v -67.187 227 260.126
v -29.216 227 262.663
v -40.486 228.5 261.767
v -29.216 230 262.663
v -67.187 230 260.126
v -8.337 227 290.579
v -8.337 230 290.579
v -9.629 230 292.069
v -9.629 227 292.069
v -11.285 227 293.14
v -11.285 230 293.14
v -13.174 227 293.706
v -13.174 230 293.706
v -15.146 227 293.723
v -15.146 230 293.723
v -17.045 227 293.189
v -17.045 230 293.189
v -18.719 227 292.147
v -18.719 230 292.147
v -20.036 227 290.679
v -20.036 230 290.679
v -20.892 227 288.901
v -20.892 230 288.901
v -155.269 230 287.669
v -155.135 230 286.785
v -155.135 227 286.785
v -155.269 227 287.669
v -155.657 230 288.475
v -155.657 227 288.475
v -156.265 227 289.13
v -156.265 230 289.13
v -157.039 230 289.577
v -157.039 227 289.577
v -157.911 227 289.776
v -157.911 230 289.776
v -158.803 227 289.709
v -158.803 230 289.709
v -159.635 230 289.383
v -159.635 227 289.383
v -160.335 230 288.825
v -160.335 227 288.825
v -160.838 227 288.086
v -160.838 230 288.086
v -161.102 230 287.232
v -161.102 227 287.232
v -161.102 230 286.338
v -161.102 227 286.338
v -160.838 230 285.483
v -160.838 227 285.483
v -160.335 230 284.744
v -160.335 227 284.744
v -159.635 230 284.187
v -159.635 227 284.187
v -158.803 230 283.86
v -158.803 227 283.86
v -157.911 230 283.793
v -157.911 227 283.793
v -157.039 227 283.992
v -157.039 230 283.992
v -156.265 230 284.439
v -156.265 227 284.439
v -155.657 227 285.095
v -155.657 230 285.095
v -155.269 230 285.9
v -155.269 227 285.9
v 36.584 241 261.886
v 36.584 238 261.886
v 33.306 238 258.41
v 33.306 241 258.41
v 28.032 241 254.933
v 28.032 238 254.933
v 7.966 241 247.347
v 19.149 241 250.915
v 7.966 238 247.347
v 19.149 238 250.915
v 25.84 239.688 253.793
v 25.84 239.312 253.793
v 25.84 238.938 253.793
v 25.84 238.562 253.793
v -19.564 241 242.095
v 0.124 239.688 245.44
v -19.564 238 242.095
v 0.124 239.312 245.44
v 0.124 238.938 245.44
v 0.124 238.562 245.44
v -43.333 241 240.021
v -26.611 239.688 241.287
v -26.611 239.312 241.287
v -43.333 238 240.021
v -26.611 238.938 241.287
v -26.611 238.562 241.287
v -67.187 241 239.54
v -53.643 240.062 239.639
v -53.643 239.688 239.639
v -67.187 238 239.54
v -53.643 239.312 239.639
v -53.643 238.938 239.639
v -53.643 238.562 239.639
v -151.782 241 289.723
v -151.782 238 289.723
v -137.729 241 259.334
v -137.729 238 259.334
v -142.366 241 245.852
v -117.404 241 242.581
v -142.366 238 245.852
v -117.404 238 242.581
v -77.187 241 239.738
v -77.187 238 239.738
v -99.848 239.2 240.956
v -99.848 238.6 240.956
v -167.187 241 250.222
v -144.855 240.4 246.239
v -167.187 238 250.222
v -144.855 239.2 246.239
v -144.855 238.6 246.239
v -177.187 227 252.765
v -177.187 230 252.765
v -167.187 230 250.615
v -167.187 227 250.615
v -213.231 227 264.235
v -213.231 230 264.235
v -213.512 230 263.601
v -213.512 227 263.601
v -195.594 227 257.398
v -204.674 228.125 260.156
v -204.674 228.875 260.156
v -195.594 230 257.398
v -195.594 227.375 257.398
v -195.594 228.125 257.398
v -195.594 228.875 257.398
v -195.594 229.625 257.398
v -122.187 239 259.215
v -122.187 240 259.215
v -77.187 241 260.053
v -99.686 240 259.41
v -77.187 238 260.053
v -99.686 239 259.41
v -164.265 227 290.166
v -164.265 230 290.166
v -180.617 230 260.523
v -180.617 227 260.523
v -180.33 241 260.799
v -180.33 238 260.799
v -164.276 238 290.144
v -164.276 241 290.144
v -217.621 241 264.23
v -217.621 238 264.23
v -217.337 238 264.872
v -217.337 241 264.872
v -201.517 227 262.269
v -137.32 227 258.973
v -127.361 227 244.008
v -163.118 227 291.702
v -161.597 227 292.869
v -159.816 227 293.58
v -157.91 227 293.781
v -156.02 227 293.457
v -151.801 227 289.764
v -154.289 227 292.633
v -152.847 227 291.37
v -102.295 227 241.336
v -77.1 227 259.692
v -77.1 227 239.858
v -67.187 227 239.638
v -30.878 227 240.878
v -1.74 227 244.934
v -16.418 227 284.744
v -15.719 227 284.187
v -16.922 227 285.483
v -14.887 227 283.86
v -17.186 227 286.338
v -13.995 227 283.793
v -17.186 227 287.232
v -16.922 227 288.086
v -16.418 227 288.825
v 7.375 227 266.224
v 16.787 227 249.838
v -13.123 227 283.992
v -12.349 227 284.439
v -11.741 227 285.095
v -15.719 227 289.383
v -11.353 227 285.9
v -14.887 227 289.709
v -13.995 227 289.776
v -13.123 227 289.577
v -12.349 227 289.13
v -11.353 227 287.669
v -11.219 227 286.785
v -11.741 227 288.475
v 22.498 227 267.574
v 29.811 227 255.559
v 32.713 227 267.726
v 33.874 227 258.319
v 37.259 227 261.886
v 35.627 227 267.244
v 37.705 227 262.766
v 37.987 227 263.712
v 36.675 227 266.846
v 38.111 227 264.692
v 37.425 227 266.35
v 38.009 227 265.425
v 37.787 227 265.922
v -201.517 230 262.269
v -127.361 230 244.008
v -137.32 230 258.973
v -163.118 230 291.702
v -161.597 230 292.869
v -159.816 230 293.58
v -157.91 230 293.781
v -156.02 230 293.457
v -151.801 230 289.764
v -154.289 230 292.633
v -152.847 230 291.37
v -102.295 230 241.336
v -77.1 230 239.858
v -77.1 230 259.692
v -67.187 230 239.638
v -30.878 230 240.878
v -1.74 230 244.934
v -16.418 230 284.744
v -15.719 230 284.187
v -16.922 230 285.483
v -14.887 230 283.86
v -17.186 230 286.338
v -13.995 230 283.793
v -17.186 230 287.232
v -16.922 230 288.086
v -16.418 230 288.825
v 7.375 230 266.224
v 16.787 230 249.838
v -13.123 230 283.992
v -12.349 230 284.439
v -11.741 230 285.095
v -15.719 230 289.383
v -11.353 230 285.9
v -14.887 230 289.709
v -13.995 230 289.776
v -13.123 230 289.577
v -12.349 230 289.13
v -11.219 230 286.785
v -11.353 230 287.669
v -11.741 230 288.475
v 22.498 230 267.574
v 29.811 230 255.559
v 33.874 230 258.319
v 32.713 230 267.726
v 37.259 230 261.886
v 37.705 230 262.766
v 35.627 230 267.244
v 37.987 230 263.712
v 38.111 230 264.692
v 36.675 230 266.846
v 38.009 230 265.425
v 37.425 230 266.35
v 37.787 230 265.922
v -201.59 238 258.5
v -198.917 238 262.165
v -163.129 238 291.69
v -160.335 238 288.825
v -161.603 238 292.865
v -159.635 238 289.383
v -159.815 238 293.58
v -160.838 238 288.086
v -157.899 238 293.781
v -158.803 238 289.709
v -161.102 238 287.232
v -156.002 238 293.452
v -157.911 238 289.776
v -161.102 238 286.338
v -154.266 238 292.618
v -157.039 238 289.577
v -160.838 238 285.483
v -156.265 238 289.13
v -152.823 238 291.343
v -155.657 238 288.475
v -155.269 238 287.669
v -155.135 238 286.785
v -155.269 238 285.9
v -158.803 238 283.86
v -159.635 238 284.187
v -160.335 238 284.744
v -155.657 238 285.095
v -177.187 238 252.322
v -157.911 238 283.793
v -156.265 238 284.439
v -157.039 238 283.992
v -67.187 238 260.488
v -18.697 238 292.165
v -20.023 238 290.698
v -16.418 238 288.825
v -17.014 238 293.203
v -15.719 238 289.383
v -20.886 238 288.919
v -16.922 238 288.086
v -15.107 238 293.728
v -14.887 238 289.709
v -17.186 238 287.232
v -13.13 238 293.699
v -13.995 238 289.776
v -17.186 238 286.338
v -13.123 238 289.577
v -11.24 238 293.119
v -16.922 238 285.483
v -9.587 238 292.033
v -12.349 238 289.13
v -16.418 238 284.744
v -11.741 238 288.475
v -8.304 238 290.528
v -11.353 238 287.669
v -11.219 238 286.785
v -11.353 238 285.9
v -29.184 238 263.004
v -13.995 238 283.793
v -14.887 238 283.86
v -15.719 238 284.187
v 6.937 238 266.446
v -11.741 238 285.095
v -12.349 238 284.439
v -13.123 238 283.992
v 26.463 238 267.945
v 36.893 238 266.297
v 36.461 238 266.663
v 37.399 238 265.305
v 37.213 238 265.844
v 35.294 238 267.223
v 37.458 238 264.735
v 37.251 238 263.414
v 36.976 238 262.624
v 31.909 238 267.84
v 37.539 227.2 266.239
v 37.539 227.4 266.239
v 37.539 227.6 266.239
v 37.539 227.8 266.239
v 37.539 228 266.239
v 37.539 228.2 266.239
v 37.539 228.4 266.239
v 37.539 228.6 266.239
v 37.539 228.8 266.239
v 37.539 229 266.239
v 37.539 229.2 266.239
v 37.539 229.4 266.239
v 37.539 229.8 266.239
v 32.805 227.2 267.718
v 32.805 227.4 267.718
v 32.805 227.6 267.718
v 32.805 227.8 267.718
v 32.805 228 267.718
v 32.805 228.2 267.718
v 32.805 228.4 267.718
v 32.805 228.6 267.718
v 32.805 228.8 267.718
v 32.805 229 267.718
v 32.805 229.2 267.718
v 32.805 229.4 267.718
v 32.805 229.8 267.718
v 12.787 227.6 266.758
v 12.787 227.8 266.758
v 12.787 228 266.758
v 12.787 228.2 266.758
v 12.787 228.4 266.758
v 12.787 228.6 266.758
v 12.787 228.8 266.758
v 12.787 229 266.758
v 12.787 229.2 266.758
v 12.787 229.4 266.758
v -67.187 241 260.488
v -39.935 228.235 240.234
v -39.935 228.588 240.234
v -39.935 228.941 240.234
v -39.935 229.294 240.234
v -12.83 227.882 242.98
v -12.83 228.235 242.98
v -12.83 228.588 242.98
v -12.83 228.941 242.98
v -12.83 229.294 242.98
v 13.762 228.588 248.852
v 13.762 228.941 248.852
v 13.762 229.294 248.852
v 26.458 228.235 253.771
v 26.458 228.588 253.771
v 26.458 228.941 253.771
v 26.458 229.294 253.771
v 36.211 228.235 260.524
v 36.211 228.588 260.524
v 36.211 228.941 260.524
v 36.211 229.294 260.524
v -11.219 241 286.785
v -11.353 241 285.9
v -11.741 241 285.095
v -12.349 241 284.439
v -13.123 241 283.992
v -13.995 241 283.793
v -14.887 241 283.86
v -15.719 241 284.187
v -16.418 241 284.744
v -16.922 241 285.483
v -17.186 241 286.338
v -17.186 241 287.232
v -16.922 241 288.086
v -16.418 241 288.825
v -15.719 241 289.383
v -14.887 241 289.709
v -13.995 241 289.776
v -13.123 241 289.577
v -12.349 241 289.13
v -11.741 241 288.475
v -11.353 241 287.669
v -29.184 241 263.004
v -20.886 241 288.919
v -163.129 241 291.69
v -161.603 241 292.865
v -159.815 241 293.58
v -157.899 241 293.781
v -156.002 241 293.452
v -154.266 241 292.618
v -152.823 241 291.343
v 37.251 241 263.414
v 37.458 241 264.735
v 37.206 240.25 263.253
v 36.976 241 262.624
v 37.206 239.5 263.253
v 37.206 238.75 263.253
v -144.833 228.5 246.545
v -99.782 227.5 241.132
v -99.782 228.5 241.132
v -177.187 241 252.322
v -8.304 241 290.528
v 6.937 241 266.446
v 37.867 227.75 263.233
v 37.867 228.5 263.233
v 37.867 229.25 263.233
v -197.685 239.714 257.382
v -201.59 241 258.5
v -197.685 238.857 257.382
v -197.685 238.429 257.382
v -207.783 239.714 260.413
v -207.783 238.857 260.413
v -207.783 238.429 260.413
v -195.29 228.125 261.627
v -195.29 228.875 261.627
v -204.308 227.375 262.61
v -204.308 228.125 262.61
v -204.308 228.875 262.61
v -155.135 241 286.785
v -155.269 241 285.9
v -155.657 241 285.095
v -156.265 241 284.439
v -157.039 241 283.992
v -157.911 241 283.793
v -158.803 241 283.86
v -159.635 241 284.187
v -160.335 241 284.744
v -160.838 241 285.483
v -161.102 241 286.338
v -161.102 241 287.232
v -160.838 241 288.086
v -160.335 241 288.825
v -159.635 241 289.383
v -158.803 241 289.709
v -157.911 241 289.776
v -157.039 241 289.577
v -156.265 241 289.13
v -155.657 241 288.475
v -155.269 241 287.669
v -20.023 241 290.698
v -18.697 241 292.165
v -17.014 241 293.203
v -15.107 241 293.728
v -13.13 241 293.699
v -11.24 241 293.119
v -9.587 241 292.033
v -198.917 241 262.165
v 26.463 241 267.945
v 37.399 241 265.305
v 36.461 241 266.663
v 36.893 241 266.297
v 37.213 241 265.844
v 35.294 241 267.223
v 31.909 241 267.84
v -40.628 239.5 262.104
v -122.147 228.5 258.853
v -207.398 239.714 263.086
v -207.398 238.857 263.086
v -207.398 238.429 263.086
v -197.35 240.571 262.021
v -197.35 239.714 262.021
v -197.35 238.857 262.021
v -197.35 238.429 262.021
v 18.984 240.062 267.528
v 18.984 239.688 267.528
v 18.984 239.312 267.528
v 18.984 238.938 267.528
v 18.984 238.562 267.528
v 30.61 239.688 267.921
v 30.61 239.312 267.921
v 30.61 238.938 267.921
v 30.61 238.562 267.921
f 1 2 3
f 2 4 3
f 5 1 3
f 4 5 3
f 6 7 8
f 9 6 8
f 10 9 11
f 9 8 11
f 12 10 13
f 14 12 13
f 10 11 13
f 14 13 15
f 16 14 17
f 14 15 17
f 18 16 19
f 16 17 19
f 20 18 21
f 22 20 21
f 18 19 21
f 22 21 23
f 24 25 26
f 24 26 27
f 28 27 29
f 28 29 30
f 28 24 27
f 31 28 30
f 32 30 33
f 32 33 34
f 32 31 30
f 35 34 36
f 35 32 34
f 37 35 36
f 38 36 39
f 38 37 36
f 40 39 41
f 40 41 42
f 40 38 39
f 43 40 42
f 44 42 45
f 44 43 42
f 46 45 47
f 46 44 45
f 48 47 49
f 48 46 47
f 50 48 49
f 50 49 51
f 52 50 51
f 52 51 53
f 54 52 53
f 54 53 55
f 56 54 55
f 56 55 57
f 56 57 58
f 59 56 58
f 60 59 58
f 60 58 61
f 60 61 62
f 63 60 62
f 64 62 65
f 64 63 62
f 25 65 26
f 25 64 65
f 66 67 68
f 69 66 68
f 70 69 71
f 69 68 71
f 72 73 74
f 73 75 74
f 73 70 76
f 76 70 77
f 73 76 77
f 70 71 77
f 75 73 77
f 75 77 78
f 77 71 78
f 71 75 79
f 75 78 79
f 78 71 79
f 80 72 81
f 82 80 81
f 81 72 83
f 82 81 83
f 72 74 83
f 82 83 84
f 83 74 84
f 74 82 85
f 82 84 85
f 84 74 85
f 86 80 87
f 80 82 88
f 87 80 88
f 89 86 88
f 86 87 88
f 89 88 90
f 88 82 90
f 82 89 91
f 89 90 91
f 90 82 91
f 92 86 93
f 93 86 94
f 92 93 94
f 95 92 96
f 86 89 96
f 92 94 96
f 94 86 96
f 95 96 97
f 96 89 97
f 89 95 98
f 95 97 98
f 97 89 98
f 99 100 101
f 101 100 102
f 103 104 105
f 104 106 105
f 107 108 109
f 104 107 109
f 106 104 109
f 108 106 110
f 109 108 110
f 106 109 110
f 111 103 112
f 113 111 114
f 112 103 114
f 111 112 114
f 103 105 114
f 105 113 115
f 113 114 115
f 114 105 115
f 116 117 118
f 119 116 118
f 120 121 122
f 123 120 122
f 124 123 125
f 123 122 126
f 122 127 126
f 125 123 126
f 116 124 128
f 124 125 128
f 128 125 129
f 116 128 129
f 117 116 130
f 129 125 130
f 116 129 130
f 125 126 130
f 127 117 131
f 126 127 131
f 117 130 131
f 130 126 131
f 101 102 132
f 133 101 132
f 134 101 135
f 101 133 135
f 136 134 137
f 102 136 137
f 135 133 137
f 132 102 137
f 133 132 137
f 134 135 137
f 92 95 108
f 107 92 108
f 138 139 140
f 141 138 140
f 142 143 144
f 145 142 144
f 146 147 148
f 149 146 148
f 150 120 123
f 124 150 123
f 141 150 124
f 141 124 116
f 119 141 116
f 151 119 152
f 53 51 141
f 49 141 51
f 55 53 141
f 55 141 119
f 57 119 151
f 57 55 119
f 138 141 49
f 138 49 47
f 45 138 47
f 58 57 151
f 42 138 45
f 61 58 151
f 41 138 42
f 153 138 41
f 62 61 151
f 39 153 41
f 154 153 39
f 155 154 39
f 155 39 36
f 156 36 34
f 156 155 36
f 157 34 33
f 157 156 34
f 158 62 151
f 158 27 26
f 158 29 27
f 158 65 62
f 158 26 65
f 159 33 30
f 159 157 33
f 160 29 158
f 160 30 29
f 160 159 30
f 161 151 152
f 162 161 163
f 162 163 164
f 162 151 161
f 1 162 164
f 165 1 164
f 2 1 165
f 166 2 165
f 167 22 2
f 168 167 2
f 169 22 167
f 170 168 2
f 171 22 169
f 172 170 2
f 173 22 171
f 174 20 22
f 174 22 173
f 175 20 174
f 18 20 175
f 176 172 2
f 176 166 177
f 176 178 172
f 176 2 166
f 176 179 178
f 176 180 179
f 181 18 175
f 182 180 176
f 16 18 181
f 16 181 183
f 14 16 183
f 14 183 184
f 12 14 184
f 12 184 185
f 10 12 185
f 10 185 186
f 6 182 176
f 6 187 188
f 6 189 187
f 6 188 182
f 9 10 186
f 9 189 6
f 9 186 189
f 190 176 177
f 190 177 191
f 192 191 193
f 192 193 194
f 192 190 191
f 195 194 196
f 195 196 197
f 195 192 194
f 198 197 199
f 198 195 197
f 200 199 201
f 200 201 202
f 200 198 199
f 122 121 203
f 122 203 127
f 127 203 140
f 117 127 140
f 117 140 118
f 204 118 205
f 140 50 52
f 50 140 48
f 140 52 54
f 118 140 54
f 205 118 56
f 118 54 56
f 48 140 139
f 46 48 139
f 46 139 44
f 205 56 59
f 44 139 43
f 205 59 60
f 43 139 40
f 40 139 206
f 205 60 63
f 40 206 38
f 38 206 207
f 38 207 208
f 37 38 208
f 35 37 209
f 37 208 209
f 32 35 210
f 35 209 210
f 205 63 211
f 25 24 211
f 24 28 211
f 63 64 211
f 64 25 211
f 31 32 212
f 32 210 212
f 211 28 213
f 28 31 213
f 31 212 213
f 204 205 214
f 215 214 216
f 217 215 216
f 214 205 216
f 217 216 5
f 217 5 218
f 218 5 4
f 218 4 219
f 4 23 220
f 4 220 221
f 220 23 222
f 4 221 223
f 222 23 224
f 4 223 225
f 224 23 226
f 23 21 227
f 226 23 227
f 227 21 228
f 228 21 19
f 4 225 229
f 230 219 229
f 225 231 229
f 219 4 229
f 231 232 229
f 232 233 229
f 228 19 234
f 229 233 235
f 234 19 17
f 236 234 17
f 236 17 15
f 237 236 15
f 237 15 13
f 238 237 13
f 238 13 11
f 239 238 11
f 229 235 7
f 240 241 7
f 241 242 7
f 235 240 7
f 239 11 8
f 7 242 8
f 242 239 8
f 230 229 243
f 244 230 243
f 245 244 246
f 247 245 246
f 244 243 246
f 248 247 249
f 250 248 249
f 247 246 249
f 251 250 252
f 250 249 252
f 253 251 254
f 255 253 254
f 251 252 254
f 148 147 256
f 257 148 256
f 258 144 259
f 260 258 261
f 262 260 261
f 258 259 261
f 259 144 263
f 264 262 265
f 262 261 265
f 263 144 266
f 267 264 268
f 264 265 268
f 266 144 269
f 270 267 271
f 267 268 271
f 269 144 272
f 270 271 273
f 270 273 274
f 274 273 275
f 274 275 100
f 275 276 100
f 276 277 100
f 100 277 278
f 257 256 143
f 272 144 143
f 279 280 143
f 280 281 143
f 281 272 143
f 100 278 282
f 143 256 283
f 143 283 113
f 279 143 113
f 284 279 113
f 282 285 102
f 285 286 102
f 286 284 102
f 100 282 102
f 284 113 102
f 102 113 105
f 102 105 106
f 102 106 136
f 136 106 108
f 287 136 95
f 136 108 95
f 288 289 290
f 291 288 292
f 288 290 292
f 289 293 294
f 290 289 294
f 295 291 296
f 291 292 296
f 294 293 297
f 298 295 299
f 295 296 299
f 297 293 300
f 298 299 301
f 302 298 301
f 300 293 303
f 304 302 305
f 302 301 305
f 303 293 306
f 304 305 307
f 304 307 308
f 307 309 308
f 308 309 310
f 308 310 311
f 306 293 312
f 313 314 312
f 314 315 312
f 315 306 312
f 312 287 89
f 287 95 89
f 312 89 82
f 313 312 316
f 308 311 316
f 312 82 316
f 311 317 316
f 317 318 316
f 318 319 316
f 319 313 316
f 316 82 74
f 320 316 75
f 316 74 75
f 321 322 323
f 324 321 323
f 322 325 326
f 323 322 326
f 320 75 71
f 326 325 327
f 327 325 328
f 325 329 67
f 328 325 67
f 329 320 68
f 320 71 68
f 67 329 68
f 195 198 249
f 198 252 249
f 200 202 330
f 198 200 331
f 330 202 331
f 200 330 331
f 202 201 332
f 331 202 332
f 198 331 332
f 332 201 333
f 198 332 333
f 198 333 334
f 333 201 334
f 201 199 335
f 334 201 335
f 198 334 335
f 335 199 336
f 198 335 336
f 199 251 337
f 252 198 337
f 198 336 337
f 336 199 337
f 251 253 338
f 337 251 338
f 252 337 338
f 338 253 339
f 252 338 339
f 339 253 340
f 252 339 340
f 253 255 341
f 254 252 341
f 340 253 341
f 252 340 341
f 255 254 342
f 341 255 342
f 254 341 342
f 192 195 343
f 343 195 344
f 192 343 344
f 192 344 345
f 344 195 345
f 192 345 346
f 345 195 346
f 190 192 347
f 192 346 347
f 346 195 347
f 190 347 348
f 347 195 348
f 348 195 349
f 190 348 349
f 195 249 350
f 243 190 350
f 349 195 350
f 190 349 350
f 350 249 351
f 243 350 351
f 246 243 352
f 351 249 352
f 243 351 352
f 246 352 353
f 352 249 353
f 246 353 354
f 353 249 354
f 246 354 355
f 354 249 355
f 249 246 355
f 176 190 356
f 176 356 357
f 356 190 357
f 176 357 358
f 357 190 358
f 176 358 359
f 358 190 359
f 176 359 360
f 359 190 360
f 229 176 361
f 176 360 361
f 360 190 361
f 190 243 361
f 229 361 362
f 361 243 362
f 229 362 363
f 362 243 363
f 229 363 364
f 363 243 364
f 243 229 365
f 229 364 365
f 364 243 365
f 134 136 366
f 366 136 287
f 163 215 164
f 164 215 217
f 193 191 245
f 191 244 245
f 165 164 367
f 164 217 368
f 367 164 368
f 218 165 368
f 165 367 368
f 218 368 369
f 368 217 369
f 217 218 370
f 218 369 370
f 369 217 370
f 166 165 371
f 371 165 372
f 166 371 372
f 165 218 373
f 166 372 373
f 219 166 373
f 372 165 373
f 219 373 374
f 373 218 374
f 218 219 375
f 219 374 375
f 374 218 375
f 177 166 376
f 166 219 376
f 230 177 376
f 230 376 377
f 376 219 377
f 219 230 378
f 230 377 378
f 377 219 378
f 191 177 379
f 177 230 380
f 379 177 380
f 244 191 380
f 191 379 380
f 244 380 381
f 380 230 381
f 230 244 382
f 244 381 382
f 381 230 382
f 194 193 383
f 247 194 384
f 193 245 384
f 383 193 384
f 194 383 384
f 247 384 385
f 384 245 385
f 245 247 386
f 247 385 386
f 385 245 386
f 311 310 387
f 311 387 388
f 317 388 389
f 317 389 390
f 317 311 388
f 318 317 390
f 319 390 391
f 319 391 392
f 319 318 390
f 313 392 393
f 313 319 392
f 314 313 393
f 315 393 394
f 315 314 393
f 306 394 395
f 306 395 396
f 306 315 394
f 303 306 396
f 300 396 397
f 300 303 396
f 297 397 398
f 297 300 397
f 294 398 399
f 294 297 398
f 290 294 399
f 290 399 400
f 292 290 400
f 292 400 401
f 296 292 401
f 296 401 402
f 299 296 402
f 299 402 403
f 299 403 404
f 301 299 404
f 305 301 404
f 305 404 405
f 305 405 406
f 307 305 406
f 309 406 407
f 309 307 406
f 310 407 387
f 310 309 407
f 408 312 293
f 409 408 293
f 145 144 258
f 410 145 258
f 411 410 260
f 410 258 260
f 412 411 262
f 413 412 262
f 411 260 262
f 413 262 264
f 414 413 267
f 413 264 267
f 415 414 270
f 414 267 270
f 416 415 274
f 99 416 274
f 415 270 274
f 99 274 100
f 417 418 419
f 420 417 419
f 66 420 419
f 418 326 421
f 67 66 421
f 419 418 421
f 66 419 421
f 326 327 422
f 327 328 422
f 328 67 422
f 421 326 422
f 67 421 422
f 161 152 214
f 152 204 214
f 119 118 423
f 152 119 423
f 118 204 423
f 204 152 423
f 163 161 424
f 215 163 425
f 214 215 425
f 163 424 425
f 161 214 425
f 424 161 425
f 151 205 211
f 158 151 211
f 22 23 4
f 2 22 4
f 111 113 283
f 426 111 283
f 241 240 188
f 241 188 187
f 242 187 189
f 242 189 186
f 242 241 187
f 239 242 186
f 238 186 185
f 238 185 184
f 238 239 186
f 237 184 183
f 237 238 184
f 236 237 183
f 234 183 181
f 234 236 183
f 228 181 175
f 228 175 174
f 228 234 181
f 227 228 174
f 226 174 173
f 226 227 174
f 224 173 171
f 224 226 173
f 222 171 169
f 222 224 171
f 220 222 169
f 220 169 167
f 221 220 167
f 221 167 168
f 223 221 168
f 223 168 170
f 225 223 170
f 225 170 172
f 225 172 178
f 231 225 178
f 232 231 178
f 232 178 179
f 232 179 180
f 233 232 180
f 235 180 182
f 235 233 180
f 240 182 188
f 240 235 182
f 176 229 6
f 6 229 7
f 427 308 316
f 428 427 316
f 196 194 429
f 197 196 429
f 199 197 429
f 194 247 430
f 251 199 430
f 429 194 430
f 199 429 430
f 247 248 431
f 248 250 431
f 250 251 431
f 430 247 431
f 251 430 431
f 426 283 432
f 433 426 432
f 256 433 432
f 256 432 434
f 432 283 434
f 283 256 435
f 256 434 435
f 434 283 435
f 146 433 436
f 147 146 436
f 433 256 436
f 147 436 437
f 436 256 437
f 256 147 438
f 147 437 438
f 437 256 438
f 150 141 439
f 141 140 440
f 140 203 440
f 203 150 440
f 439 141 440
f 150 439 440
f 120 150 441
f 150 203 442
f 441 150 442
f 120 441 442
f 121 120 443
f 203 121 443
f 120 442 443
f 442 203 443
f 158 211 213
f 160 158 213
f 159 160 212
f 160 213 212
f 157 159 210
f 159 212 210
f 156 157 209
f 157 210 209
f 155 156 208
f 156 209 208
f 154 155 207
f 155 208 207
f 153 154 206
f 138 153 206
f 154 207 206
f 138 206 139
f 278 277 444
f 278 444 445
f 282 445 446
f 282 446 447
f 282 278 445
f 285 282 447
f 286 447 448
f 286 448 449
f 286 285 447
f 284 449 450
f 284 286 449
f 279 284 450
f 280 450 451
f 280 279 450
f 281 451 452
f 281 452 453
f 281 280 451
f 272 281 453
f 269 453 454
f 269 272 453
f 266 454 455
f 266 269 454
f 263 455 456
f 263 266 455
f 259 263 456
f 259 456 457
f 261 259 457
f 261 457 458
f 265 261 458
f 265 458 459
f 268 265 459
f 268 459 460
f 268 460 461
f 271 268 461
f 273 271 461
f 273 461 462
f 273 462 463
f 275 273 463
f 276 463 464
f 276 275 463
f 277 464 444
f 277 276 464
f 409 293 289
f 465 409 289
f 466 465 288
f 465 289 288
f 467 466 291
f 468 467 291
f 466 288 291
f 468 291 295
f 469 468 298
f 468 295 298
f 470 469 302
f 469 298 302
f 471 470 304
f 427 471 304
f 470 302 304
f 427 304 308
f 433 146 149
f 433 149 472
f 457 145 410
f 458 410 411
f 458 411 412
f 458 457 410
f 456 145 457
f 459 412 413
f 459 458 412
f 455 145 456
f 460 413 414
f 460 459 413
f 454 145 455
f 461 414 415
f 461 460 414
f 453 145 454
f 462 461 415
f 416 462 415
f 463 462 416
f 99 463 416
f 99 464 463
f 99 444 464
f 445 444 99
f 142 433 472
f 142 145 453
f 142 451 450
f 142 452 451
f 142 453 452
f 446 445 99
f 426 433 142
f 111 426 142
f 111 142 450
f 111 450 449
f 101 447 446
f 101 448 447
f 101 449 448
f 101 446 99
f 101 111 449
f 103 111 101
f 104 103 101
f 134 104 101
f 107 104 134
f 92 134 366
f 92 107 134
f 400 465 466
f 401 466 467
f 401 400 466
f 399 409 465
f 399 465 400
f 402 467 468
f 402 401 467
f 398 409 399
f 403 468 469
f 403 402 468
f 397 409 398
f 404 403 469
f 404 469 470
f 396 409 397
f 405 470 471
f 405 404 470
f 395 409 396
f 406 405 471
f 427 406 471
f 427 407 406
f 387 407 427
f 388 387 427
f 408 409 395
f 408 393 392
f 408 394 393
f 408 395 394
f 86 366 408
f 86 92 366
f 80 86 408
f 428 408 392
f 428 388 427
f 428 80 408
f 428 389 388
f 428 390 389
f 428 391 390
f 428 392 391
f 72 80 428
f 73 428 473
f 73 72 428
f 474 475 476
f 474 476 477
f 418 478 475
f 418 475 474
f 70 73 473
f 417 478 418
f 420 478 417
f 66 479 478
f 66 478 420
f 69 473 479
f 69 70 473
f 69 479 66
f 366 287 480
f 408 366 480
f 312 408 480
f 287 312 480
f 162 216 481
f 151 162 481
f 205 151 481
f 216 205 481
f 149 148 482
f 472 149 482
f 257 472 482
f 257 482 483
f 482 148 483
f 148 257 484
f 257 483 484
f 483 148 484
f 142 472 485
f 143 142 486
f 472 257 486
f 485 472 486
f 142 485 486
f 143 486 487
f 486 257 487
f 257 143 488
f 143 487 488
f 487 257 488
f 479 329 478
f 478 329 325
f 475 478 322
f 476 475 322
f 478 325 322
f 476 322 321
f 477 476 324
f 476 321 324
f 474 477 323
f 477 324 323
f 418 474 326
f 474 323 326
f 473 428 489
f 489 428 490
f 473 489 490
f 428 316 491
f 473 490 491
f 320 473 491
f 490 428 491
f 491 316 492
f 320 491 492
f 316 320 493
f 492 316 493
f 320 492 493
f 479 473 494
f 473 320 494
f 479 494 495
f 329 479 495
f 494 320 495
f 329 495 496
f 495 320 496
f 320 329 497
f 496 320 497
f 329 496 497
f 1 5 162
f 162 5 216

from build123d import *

# Parameters (mm, degrees)
SZKIC5_R                    = 3
DODANIE_WYCI_GNI_CIE1_DEPTH = 3
SZKIC6_R                    = 3
DODANIE_WYCI_GNI_CIE2_DEPTH = 3


with BuildPart() as part:
    # Szkic5 → Dodanie-wyciągnięcie1 (new body)
    with BuildSketch(Plane(origin=(0, 238, 0), x_dir=(1, 0, 0), z_dir=(0, 1, 0))):
        with BuildLine():
            Line((-217.621483836, -264.229627813), (-217.336994821, -264.87228097))
            add(Edge.make_bspline(
                [(-217.336994821, -264.87228097), (-216.524251746, -264.64941213), (-215.708414587, -264.44009422), (-214.060701234, -264.091703348), (-213.229095975, -263.95042135), (-210.734466698, -263.544586682), (-209.068304452, -263.298661057), (-205.727674147, -262.87331659), (-204.053883814, -262.688471023), (-200.704198463, -262.335632645), (-199.027655474, -262.171215157), (-193.994257482, -261.719774509), (-190.635355721, -261.465840041), (-184.960732923, -261.077127862), (-182.645707604, -260.932445278), (-180.32988849, -260.799063872)],
                knots=[0, 0, 0, 0, 0.0625, 0.0625, 0.125, 0.125, 0.25, 0.25, 0.375, 0.375, 0.5, 0.5, 0.75, 0.75, 0.92214748, 0.92214748, 0.92214748, 0.92214748], degree=3))
            Line((-180.32988849, -260.799063872), (-164.276497186, -290.144205364))
            ThreePointArc((-164.276497186, -290.144205364), (-157.899417061, -293.78069291), (-151.781835373, -289.722813305))
            Line((-151.781835373, -289.722813305), (-137.728906741, -259.334339822))
            add(Edge.make_bspline(
                [(-137.728906741, -259.334339822), (-132.548108585, -259.259957785), (-127.367426672, -259.220604013), (-114.686266361, -259.207555796), (-107.185914373, -259.271953011), (-92.185702095, -259.548912987), (-84.685072734, -259.761345903), (-77.187477809, -260.052501815)],
                knots=[0.32732798, 0.32732798, 0.32732798, 0.32732798, 0.5, 0.5, 0.75, 0.75, 1, 1, 1, 1], degree=3))
            Line((-77.187477809, -260.052501815), (-67.187477851, -260.487776944))
            add(Edge.make_bspline(
                [(-67.187477851, -260.487776944), (-58.32766484, -260.915181374), (-49.472971628, -261.455568777), (-36.811235704, -262.38407526), (-32.996403084, -262.682920862), (-29.183533603, -263.003801126)],
                knots=[0, 0, 0, 0, 0.25, 0.25, 0.357869734, 0.357869734, 0.357869734, 0.357869734], degree=3))
            Line((-29.183533603, -263.003801126), (-20.885838964, -288.919212053))
            ThreePointArc((-20.885838964, -288.919212053), (-15.10720147, -293.728120595), (-8.304342773, -290.528219626))
            Line((-8.304342773, -290.528219626), (6.937299884, -266.446117532))
            add(Edge.make_bspline(
                [(6.937299884, -266.446117532), (8.743620815, -266.62254106), (10.550231116, -266.795716646), (14.564818443, -267.168384755), (16.773153564, -267.363411544), (20.089312757, -267.609922909), (21.19536559, -267.684816125), (23.408308538, -267.817850843), (24.515163217, -267.876696188), (26.730636503, -267.959071889), (27.839248431, -267.981090967), (29.501605944, -267.961470678), (30.055935582, -267.946372101), (31.163310398, -267.895568492), (31.716349127, -267.860380396), (32.820112211, -267.755088467), (33.370294556, -267.685569662), (34.185351903, -267.529765615), (34.455447712, -267.469072407), (34.991451854, -267.324618872), (35.256616721, -267.24182603), (35.772971322, -267.043663657), (36.026317432, -266.927931118), (36.385529035, -266.716197032), (36.500736955, -266.639417318), (36.718928374, -266.469119692), (36.822857912, -266.374625212), (37.009414856, -266.168580037), (37.091759033, -266.057703984), (37.231498063, -265.818032231), (37.288842861, -265.688986423), (37.418790516, -265.294501953), (37.453207535, -265.014441354), (37.457874933, -264.734992214)],
                knots=[0.698836384, 0.698836384, 0.698836384, 0.698836384, 0.75, 0.75, 0.8125, 0.8125, 0.84375, 0.84375, 0.875, 0.875, 0.90625, 0.90625, 0.921875, 0.921875, 0.9375, 0.9375, 0.953125, 0.953125, 0.9609375, 0.9609375, 0.96875, 0.96875, 0.9765625, 0.9765625, 0.98046875, 0.98046875, 0.984375, 0.984375, 0.98828125, 0.98828125, 0.9921875, 0.9921875, 1, 1, 1, 1], degree=3))
            add(Edge.make_bspline(
                [(37.457874933, -264.734992214), (37.447307587, -264.483392729), (37.41848087, -264.23406027), (37.33363794, -263.738771113), (37.27750378, -263.493240453), (37.133832229, -263.012703951), (37.045593151, -262.776093324), (36.837114669, -262.319794772), (36.717139813, -262.099591951), (36.584242776, -261.885914808)],
                knots=[0, 0, 0, 0, 0.25, 0.25, 0.5, 0.5, 0.75, 0.75, 1, 1, 1, 1], degree=3))
            add(Edge.make_bspline(
                [(36.584242776, -261.885914808), (36.27860279, -261.394461341), (35.919039572, -260.952691489), (35.157723901, -260.108023965), (34.754749419, -259.706252242), (33.920624453, -258.928669512), (33.486868131, -258.552907315), (32.599935756, -257.83955132), (32.14623595, -257.50042651), (30.759380309, -256.527230368), (29.80124069, -255.936012406), (27.847669337, -254.817541682), (26.85134856, -254.291813847), (24.827758173, -253.293443084), (23.799699869, -252.821214557), (21.719003409, -251.922804441), (20.670860128, -251.498241031), (17.507840792, -250.283315752), (15.374688976, -249.550727069), (11.071792042, -248.201228132), (8.901838928, -247.584975401), (4.532467444, -246.445615254), (2.33083291, -245.922261993), (-4.291115044, -244.47467329), (-8.729992949, -243.670655148), (-17.64438867, -242.305980393), (-22.120060781, -241.746348593), (-31.101669829, -240.828103351), (-35.608641857, -240.469929105), (-44.621387532, -239.928777021), (-49.130860769, -239.74555865), (-58.155230695, -239.531934505), (-62.670117957, -239.50126313), (-67.187477851, -239.540261269)],
                knots=[0, 0, 0, 0, 0.015625, 0.015625, 0.03125, 0.03125, 0.046875, 0.046875, 0.0625, 0.0625, 0.09375, 0.09375, 0.125, 0.125, 0.15625, 0.15625, 0.1875, 0.1875, 0.25, 0.25, 0.3125, 0.3125, 0.375, 0.375, 0.5, 0.5, 0.625, 0.625, 0.75, 0.75, 0.875, 0.875, 1, 1, 1, 1], degree=3))
            Line((-67.187477851, -239.540261269), (-77.187477809, -239.737805085))
            add(Edge.make_bspline(
                [(-77.187477809, -239.737805085), (-80.96883775, -239.853554602), (-84.748045673, -240.014473104), (-92.302382502, -240.421925103), (-96.078141665, -240.668566402), (-107.387458792, -241.52948044), (-114.906920153, -242.264039468), (-129.908697906, -244.030223333), (-137.391055865, -245.061515738), (-152.319179963, -247.416742581), (-159.768554901, -248.739980764), (-167.187460508, -250.22154165)],
                knots=[0, 0, 0, 0, 0.125, 0.125, 0.25, 0.25, 0.5, 0.5, 0.75, 0.75, 1, 1, 1, 1], degree=3))
            Line((-167.187460508, -250.22154165), (-177.187477809, -252.321954819))
            add(Edge.make_bspline(
                [(-177.187477809, -252.321954819), (-180.624552007, -253.08048169), (-184.052746461, -253.875929186), (-190.887399363, -255.557199196), (-194.296565633, -256.438692834), (-199.37903267, -257.852994817), (-201.067813223, -258.340705566), (-204.434624431, -259.348679498), (-206.114020702, -259.864807376), (-209.451561178, -260.961417835), (-211.109722558, -261.541848411), (-213.582926098, -262.45500522), (-214.403746995, -262.770232499), (-216.02462962, -263.463549194), (-216.824492989, -263.842239273), (-217.621483836, -264.229627813)],
                knots=[0, 0, 0, 0, 0.25, 0.25, 0.5, 0.5, 0.625, 0.625, 0.75, 0.75, 0.875, 0.875, 0.9375, 0.9375, 1, 1, 1, 1], degree=3))
        make_face()
        with Locations((-14.2192257, -286.784670513)):
            Circle(SZKIC5_R, mode=Mode.SUBTRACT)
        with Locations((-158.135363286, -286.784670513)):
            Circle(SZKIC5_R, mode=Mode.SUBTRACT)
    extrude(amount=DODANIE_WYCI_GNI_CIE1_DEPTH)


with BuildPart() as body_2:
    # Szkic6 → Dodanie-wyciągnięcie2 (new body)
    with BuildSketch(Plane.XZ.offset(-229.999999684)):
        with BuildLine():
            Line((-20.891500237, 288.901449317), (-29.215786562, 262.662560496))
            add(Edge.make_bspline(
                [(-29.215786562, 262.662560496), (-32.970793032, 262.343169873), (-36.727483431, 262.045831102), (-49.377539494, 261.106282985), (-58.278097232, 260.558257239), (-67.187477852, 260.125771269)],
                knots=[0.644340635, 0.644340635, 0.644340635, 0.644340635, 0.75, 0.75, 1, 1, 1, 1], degree=3))
            Line((-67.187477852, 260.125771269), (-77.100180151, 259.691579953))
            add(Edge.make_bspline(
                [(-77.100180151, 259.691579953), (-92.109908332, 259.104983769), (-107.131065459, 258.833934183), (-127.204829254, 258.859690732), (-132.262623565, 258.899187952), (-137.320223468, 258.972831386)],
                knots=[0, 0, 0, 0, 0.5, 0.5, 0.66842221, 0.66842221, 0.66842221, 0.66842221], degree=3))
            Line((-137.320223468, 258.972831386), (-151.800908071, 289.763710144))
            ThreePointArc((-151.800908071, 289.763710144), (-157.909668811, 293.781031139), (-164.264647603, 290.165775918))
            Line((-164.264647603, 290.165775918), (-180.616624417, 260.522832843))
            add(Edge.make_bspline(
                [(-180.616624417, 260.522832843), (-182.493301494, 260.63836347), (-184.369413876, 260.762388462), (-189.262195351, 261.10981356), (-192.277944307, 261.345744825), (-196.796312793, 261.767892425), (-198.301399641, 261.919649362), (-201.30843242, 262.241113307), (-202.810410036, 262.412205749), (-205.057459681, 262.708681739), (-205.80539464, 262.814789342), (-207.299730516, 263.037333174), (-208.046317133, 263.152519085), (-209.537277472, 263.397790206), (-210.281526427, 263.528715457), (-211.761514774, 263.847860353), (-212.497234354, 264.036213388), (-213.231366735, 264.235252934)],
                knots=[0.094621775, 0.094621775, 0.094621775, 0.094621775, 0.25, 0.25, 0.5, 0.5, 0.625, 0.625, 0.75, 0.75, 0.8125, 0.8125, 0.875, 0.875, 0.9375, 0.9375, 1, 1, 1, 1], degree=3))
            Line((-213.231366735, 264.235252934), (-213.511668484, 263.601049744))
            add(Edge.make_bspline(
                [(-213.511668484, 263.601049744), (-212.795694173, 263.256191843), (-212.077427616, 262.917799439), (-210.623241682, 262.290806268), (-209.887104074, 262.002821034), (-208.405913358, 261.451997661), (-207.661990376, 261.185971885), (-206.171386796, 260.661698473), (-205.424002038, 260.405436996), (-203.174660884, 259.656923904), (-201.665215498, 259.185795767), (-198.63604595, 258.27253185), (-197.116828704, 257.827952687), (-192.549099551, 256.536908745), (-189.489642337, 255.732197165), (-183.352251843, 254.195085169), (-180.274129794, 253.46342355), (-177.187477809, 252.765146182)],
                knots=[0, 0, 0, 0, 0.0625, 0.0625, 0.125, 0.125, 0.1875, 0.1875, 0.25, 0.25, 0.375, 0.375, 0.5, 0.5, 0.75, 0.75, 1, 1, 1, 1], degree=3))
            Line((-177.187477809, 252.765146182), (-167.187460508, 250.615415308))
            add(Edge.make_bspline(
                [(-167.187460508, 250.615415308), (-163.4762283, 249.857598754), (-159.757194432, 249.141305806), (-152.304641953, 247.785813577), (-148.570544679, 247.146649381), (-137.35819434, 245.341673931), (-129.866595376, 244.287675975), (-114.849893841, 242.479267101), (-107.324773255, 241.725017275), (-96.01003893, 240.835552658), (-92.233936919, 240.579516888), (-84.672146707, 240.153164435), (-80.886594095, 239.982885941), (-77.100180151, 239.858046276)],
                knots=[0, 0, 0, 0, 0.125, 0.125, 0.25, 0.25, 0.5, 0.5, 0.75, 0.75, 0.875, 0.875, 1, 1, 1, 1], degree=3))
            Line((-77.100180151, 239.858046276), (-67.187477851, 239.637502802))
            add(Edge.make_bspline(
                [(-67.187477851, 239.637502802), (-62.642451296, 239.586329504), (-58.098009464, 239.605559168), (-49.01040898, 239.798518641), (-44.468663763, 239.972129202), (-35.401774311, 240.495112022), (-30.87506353, 240.844371603), (-24.096773442, 241.521746819), (-21.839319637, 241.773296055), (-17.328743108, 242.332844511), (-15.075802975, 242.64091678), (-8.337413379, 243.657912381), (-3.867987376, 244.458271394), (2.791147733, 245.899977903), (5.004501136, 246.421357183), (9.40768675, 247.56011241), (11.594338971, 248.176431419), (15.930101914, 249.527019984), (18.079400287, 250.260699966), (21.266132664, 251.478145245), (22.32302148, 251.904067878), (24.41018445, 252.80048995), (25.441413746, 253.271581574), (27.473820784, 254.269430856), (28.475275307, 254.795675816), (30.441229829, 255.916618489), (31.406623556, 256.509660702), (32.806869488, 257.48784913), (33.266264909, 257.829966961), (34.16105315, 258.547953497), (34.593068233, 258.921837868), (35.42671254, 259.699028412), (35.829678651, 260.101040113), (36.591931528, 260.947357038), (36.952564828, 261.390358448), (37.258921121, 261.885914808)],
                knots=[0, 0, 0, 0, 0.125, 0.125, 0.25, 0.25, 0.375, 0.375, 0.4375, 0.4375, 0.5, 0.5, 0.625, 0.625, 0.6875, 0.6875, 0.75, 0.75, 0.8125, 0.8125, 0.84375, 0.84375, 0.875, 0.875, 0.90625, 0.90625, 0.9375, 0.9375, 0.953125, 0.953125, 0.96875, 0.96875, 0.984375, 0.984375, 1, 1, 1, 1], degree=3))
            add(Edge.make_bspline(
                [(37.258921121, 261.885914808), (37.389123894, 262.096517164), (37.506666282, 262.313616063), (37.710799842, 262.763696153), (37.79682304, 262.996395066), (37.936864263, 263.469528567), (37.991492793, 263.711593238), (38.073542365, 264.19865361), (38.101232558, 264.443916104), (38.110958839, 264.691512304)],
                knots=[0, 0, 0, 0, 0.25, 0.25, 0.5, 0.5, 0.75, 0.75, 1, 1, 1, 1], degree=3))
            add(Edge.make_bspline(
                [(38.110958839, 264.691512304), (38.105450454, 264.97503637), (38.070240518, 265.252920472), (37.932512112, 265.653622587), (37.871723379, 265.784278977), (37.724636177, 266.024446344), (37.637330167, 266.1363289), (37.341926894, 266.445477772), (37.111833277, 266.607877539), (36.61546919, 266.88499914), (36.357859291, 266.996332826), (35.832100479, 267.186761327), (35.563828865, 267.265915117), (35.020312101, 267.403452327), (34.743942023, 267.461240628), (33.914355815, 267.607513604), (33.360047105, 267.670660169), (32.250272997, 267.765181607), (31.694784148, 267.795912326), (30.58310942, 267.838227899), (30.026899636, 267.849156103), (28.357334297, 267.856231238), (27.243023643, 267.826143683), (25.013085827, 267.729806995), (23.899368809, 267.66525799), (21.673545947, 267.521287373), (20.561407664, 267.440878272), (17.227012665, 267.177643833), (15.006857619, 266.971919857), (10.982806472, 266.584371065), (9.178642012, 266.405470132), (7.374746204, 266.223642119)],
                knots=[0, 0, 0, 0, 0.0078125, 0.0078125, 0.01171875, 0.01171875, 0.015625, 0.015625, 0.0234375, 0.0234375, 0.03125, 0.03125, 0.0390625, 0.0390625, 0.046875, 0.046875, 0.0625, 0.0625, 0.078125, 0.078125, 0.09375, 0.09375, 0.125, 0.125, 0.15625, 0.15625, 0.1875, 0.1875, 0.25, 0.25, 0.300819406, 0.300819406, 0.300819406, 0.300819406], degree=3))
            Line((7.374746204, 266.223642119), (-8.33697323, 290.579285893))
            ThreePointArc((-8.33697323, 290.579285893), (-15.146489207, 293.722983161), (-20.891500237, 288.901449317))
        make_face()
        with Locations((-14.2192257, 286.784670513)):
            Circle(SZKIC6_R, mode=Mode.SUBTRACT)
        with Locations((-158.135363286, 286.784670513)):
            Circle(SZKIC6_R, mode=Mode.SUBTRACT)
    extrude(amount=DODANIE_WYCI_GNI_CIE2_DEPTH)


solid = Compound([part.part, body_2.part])
